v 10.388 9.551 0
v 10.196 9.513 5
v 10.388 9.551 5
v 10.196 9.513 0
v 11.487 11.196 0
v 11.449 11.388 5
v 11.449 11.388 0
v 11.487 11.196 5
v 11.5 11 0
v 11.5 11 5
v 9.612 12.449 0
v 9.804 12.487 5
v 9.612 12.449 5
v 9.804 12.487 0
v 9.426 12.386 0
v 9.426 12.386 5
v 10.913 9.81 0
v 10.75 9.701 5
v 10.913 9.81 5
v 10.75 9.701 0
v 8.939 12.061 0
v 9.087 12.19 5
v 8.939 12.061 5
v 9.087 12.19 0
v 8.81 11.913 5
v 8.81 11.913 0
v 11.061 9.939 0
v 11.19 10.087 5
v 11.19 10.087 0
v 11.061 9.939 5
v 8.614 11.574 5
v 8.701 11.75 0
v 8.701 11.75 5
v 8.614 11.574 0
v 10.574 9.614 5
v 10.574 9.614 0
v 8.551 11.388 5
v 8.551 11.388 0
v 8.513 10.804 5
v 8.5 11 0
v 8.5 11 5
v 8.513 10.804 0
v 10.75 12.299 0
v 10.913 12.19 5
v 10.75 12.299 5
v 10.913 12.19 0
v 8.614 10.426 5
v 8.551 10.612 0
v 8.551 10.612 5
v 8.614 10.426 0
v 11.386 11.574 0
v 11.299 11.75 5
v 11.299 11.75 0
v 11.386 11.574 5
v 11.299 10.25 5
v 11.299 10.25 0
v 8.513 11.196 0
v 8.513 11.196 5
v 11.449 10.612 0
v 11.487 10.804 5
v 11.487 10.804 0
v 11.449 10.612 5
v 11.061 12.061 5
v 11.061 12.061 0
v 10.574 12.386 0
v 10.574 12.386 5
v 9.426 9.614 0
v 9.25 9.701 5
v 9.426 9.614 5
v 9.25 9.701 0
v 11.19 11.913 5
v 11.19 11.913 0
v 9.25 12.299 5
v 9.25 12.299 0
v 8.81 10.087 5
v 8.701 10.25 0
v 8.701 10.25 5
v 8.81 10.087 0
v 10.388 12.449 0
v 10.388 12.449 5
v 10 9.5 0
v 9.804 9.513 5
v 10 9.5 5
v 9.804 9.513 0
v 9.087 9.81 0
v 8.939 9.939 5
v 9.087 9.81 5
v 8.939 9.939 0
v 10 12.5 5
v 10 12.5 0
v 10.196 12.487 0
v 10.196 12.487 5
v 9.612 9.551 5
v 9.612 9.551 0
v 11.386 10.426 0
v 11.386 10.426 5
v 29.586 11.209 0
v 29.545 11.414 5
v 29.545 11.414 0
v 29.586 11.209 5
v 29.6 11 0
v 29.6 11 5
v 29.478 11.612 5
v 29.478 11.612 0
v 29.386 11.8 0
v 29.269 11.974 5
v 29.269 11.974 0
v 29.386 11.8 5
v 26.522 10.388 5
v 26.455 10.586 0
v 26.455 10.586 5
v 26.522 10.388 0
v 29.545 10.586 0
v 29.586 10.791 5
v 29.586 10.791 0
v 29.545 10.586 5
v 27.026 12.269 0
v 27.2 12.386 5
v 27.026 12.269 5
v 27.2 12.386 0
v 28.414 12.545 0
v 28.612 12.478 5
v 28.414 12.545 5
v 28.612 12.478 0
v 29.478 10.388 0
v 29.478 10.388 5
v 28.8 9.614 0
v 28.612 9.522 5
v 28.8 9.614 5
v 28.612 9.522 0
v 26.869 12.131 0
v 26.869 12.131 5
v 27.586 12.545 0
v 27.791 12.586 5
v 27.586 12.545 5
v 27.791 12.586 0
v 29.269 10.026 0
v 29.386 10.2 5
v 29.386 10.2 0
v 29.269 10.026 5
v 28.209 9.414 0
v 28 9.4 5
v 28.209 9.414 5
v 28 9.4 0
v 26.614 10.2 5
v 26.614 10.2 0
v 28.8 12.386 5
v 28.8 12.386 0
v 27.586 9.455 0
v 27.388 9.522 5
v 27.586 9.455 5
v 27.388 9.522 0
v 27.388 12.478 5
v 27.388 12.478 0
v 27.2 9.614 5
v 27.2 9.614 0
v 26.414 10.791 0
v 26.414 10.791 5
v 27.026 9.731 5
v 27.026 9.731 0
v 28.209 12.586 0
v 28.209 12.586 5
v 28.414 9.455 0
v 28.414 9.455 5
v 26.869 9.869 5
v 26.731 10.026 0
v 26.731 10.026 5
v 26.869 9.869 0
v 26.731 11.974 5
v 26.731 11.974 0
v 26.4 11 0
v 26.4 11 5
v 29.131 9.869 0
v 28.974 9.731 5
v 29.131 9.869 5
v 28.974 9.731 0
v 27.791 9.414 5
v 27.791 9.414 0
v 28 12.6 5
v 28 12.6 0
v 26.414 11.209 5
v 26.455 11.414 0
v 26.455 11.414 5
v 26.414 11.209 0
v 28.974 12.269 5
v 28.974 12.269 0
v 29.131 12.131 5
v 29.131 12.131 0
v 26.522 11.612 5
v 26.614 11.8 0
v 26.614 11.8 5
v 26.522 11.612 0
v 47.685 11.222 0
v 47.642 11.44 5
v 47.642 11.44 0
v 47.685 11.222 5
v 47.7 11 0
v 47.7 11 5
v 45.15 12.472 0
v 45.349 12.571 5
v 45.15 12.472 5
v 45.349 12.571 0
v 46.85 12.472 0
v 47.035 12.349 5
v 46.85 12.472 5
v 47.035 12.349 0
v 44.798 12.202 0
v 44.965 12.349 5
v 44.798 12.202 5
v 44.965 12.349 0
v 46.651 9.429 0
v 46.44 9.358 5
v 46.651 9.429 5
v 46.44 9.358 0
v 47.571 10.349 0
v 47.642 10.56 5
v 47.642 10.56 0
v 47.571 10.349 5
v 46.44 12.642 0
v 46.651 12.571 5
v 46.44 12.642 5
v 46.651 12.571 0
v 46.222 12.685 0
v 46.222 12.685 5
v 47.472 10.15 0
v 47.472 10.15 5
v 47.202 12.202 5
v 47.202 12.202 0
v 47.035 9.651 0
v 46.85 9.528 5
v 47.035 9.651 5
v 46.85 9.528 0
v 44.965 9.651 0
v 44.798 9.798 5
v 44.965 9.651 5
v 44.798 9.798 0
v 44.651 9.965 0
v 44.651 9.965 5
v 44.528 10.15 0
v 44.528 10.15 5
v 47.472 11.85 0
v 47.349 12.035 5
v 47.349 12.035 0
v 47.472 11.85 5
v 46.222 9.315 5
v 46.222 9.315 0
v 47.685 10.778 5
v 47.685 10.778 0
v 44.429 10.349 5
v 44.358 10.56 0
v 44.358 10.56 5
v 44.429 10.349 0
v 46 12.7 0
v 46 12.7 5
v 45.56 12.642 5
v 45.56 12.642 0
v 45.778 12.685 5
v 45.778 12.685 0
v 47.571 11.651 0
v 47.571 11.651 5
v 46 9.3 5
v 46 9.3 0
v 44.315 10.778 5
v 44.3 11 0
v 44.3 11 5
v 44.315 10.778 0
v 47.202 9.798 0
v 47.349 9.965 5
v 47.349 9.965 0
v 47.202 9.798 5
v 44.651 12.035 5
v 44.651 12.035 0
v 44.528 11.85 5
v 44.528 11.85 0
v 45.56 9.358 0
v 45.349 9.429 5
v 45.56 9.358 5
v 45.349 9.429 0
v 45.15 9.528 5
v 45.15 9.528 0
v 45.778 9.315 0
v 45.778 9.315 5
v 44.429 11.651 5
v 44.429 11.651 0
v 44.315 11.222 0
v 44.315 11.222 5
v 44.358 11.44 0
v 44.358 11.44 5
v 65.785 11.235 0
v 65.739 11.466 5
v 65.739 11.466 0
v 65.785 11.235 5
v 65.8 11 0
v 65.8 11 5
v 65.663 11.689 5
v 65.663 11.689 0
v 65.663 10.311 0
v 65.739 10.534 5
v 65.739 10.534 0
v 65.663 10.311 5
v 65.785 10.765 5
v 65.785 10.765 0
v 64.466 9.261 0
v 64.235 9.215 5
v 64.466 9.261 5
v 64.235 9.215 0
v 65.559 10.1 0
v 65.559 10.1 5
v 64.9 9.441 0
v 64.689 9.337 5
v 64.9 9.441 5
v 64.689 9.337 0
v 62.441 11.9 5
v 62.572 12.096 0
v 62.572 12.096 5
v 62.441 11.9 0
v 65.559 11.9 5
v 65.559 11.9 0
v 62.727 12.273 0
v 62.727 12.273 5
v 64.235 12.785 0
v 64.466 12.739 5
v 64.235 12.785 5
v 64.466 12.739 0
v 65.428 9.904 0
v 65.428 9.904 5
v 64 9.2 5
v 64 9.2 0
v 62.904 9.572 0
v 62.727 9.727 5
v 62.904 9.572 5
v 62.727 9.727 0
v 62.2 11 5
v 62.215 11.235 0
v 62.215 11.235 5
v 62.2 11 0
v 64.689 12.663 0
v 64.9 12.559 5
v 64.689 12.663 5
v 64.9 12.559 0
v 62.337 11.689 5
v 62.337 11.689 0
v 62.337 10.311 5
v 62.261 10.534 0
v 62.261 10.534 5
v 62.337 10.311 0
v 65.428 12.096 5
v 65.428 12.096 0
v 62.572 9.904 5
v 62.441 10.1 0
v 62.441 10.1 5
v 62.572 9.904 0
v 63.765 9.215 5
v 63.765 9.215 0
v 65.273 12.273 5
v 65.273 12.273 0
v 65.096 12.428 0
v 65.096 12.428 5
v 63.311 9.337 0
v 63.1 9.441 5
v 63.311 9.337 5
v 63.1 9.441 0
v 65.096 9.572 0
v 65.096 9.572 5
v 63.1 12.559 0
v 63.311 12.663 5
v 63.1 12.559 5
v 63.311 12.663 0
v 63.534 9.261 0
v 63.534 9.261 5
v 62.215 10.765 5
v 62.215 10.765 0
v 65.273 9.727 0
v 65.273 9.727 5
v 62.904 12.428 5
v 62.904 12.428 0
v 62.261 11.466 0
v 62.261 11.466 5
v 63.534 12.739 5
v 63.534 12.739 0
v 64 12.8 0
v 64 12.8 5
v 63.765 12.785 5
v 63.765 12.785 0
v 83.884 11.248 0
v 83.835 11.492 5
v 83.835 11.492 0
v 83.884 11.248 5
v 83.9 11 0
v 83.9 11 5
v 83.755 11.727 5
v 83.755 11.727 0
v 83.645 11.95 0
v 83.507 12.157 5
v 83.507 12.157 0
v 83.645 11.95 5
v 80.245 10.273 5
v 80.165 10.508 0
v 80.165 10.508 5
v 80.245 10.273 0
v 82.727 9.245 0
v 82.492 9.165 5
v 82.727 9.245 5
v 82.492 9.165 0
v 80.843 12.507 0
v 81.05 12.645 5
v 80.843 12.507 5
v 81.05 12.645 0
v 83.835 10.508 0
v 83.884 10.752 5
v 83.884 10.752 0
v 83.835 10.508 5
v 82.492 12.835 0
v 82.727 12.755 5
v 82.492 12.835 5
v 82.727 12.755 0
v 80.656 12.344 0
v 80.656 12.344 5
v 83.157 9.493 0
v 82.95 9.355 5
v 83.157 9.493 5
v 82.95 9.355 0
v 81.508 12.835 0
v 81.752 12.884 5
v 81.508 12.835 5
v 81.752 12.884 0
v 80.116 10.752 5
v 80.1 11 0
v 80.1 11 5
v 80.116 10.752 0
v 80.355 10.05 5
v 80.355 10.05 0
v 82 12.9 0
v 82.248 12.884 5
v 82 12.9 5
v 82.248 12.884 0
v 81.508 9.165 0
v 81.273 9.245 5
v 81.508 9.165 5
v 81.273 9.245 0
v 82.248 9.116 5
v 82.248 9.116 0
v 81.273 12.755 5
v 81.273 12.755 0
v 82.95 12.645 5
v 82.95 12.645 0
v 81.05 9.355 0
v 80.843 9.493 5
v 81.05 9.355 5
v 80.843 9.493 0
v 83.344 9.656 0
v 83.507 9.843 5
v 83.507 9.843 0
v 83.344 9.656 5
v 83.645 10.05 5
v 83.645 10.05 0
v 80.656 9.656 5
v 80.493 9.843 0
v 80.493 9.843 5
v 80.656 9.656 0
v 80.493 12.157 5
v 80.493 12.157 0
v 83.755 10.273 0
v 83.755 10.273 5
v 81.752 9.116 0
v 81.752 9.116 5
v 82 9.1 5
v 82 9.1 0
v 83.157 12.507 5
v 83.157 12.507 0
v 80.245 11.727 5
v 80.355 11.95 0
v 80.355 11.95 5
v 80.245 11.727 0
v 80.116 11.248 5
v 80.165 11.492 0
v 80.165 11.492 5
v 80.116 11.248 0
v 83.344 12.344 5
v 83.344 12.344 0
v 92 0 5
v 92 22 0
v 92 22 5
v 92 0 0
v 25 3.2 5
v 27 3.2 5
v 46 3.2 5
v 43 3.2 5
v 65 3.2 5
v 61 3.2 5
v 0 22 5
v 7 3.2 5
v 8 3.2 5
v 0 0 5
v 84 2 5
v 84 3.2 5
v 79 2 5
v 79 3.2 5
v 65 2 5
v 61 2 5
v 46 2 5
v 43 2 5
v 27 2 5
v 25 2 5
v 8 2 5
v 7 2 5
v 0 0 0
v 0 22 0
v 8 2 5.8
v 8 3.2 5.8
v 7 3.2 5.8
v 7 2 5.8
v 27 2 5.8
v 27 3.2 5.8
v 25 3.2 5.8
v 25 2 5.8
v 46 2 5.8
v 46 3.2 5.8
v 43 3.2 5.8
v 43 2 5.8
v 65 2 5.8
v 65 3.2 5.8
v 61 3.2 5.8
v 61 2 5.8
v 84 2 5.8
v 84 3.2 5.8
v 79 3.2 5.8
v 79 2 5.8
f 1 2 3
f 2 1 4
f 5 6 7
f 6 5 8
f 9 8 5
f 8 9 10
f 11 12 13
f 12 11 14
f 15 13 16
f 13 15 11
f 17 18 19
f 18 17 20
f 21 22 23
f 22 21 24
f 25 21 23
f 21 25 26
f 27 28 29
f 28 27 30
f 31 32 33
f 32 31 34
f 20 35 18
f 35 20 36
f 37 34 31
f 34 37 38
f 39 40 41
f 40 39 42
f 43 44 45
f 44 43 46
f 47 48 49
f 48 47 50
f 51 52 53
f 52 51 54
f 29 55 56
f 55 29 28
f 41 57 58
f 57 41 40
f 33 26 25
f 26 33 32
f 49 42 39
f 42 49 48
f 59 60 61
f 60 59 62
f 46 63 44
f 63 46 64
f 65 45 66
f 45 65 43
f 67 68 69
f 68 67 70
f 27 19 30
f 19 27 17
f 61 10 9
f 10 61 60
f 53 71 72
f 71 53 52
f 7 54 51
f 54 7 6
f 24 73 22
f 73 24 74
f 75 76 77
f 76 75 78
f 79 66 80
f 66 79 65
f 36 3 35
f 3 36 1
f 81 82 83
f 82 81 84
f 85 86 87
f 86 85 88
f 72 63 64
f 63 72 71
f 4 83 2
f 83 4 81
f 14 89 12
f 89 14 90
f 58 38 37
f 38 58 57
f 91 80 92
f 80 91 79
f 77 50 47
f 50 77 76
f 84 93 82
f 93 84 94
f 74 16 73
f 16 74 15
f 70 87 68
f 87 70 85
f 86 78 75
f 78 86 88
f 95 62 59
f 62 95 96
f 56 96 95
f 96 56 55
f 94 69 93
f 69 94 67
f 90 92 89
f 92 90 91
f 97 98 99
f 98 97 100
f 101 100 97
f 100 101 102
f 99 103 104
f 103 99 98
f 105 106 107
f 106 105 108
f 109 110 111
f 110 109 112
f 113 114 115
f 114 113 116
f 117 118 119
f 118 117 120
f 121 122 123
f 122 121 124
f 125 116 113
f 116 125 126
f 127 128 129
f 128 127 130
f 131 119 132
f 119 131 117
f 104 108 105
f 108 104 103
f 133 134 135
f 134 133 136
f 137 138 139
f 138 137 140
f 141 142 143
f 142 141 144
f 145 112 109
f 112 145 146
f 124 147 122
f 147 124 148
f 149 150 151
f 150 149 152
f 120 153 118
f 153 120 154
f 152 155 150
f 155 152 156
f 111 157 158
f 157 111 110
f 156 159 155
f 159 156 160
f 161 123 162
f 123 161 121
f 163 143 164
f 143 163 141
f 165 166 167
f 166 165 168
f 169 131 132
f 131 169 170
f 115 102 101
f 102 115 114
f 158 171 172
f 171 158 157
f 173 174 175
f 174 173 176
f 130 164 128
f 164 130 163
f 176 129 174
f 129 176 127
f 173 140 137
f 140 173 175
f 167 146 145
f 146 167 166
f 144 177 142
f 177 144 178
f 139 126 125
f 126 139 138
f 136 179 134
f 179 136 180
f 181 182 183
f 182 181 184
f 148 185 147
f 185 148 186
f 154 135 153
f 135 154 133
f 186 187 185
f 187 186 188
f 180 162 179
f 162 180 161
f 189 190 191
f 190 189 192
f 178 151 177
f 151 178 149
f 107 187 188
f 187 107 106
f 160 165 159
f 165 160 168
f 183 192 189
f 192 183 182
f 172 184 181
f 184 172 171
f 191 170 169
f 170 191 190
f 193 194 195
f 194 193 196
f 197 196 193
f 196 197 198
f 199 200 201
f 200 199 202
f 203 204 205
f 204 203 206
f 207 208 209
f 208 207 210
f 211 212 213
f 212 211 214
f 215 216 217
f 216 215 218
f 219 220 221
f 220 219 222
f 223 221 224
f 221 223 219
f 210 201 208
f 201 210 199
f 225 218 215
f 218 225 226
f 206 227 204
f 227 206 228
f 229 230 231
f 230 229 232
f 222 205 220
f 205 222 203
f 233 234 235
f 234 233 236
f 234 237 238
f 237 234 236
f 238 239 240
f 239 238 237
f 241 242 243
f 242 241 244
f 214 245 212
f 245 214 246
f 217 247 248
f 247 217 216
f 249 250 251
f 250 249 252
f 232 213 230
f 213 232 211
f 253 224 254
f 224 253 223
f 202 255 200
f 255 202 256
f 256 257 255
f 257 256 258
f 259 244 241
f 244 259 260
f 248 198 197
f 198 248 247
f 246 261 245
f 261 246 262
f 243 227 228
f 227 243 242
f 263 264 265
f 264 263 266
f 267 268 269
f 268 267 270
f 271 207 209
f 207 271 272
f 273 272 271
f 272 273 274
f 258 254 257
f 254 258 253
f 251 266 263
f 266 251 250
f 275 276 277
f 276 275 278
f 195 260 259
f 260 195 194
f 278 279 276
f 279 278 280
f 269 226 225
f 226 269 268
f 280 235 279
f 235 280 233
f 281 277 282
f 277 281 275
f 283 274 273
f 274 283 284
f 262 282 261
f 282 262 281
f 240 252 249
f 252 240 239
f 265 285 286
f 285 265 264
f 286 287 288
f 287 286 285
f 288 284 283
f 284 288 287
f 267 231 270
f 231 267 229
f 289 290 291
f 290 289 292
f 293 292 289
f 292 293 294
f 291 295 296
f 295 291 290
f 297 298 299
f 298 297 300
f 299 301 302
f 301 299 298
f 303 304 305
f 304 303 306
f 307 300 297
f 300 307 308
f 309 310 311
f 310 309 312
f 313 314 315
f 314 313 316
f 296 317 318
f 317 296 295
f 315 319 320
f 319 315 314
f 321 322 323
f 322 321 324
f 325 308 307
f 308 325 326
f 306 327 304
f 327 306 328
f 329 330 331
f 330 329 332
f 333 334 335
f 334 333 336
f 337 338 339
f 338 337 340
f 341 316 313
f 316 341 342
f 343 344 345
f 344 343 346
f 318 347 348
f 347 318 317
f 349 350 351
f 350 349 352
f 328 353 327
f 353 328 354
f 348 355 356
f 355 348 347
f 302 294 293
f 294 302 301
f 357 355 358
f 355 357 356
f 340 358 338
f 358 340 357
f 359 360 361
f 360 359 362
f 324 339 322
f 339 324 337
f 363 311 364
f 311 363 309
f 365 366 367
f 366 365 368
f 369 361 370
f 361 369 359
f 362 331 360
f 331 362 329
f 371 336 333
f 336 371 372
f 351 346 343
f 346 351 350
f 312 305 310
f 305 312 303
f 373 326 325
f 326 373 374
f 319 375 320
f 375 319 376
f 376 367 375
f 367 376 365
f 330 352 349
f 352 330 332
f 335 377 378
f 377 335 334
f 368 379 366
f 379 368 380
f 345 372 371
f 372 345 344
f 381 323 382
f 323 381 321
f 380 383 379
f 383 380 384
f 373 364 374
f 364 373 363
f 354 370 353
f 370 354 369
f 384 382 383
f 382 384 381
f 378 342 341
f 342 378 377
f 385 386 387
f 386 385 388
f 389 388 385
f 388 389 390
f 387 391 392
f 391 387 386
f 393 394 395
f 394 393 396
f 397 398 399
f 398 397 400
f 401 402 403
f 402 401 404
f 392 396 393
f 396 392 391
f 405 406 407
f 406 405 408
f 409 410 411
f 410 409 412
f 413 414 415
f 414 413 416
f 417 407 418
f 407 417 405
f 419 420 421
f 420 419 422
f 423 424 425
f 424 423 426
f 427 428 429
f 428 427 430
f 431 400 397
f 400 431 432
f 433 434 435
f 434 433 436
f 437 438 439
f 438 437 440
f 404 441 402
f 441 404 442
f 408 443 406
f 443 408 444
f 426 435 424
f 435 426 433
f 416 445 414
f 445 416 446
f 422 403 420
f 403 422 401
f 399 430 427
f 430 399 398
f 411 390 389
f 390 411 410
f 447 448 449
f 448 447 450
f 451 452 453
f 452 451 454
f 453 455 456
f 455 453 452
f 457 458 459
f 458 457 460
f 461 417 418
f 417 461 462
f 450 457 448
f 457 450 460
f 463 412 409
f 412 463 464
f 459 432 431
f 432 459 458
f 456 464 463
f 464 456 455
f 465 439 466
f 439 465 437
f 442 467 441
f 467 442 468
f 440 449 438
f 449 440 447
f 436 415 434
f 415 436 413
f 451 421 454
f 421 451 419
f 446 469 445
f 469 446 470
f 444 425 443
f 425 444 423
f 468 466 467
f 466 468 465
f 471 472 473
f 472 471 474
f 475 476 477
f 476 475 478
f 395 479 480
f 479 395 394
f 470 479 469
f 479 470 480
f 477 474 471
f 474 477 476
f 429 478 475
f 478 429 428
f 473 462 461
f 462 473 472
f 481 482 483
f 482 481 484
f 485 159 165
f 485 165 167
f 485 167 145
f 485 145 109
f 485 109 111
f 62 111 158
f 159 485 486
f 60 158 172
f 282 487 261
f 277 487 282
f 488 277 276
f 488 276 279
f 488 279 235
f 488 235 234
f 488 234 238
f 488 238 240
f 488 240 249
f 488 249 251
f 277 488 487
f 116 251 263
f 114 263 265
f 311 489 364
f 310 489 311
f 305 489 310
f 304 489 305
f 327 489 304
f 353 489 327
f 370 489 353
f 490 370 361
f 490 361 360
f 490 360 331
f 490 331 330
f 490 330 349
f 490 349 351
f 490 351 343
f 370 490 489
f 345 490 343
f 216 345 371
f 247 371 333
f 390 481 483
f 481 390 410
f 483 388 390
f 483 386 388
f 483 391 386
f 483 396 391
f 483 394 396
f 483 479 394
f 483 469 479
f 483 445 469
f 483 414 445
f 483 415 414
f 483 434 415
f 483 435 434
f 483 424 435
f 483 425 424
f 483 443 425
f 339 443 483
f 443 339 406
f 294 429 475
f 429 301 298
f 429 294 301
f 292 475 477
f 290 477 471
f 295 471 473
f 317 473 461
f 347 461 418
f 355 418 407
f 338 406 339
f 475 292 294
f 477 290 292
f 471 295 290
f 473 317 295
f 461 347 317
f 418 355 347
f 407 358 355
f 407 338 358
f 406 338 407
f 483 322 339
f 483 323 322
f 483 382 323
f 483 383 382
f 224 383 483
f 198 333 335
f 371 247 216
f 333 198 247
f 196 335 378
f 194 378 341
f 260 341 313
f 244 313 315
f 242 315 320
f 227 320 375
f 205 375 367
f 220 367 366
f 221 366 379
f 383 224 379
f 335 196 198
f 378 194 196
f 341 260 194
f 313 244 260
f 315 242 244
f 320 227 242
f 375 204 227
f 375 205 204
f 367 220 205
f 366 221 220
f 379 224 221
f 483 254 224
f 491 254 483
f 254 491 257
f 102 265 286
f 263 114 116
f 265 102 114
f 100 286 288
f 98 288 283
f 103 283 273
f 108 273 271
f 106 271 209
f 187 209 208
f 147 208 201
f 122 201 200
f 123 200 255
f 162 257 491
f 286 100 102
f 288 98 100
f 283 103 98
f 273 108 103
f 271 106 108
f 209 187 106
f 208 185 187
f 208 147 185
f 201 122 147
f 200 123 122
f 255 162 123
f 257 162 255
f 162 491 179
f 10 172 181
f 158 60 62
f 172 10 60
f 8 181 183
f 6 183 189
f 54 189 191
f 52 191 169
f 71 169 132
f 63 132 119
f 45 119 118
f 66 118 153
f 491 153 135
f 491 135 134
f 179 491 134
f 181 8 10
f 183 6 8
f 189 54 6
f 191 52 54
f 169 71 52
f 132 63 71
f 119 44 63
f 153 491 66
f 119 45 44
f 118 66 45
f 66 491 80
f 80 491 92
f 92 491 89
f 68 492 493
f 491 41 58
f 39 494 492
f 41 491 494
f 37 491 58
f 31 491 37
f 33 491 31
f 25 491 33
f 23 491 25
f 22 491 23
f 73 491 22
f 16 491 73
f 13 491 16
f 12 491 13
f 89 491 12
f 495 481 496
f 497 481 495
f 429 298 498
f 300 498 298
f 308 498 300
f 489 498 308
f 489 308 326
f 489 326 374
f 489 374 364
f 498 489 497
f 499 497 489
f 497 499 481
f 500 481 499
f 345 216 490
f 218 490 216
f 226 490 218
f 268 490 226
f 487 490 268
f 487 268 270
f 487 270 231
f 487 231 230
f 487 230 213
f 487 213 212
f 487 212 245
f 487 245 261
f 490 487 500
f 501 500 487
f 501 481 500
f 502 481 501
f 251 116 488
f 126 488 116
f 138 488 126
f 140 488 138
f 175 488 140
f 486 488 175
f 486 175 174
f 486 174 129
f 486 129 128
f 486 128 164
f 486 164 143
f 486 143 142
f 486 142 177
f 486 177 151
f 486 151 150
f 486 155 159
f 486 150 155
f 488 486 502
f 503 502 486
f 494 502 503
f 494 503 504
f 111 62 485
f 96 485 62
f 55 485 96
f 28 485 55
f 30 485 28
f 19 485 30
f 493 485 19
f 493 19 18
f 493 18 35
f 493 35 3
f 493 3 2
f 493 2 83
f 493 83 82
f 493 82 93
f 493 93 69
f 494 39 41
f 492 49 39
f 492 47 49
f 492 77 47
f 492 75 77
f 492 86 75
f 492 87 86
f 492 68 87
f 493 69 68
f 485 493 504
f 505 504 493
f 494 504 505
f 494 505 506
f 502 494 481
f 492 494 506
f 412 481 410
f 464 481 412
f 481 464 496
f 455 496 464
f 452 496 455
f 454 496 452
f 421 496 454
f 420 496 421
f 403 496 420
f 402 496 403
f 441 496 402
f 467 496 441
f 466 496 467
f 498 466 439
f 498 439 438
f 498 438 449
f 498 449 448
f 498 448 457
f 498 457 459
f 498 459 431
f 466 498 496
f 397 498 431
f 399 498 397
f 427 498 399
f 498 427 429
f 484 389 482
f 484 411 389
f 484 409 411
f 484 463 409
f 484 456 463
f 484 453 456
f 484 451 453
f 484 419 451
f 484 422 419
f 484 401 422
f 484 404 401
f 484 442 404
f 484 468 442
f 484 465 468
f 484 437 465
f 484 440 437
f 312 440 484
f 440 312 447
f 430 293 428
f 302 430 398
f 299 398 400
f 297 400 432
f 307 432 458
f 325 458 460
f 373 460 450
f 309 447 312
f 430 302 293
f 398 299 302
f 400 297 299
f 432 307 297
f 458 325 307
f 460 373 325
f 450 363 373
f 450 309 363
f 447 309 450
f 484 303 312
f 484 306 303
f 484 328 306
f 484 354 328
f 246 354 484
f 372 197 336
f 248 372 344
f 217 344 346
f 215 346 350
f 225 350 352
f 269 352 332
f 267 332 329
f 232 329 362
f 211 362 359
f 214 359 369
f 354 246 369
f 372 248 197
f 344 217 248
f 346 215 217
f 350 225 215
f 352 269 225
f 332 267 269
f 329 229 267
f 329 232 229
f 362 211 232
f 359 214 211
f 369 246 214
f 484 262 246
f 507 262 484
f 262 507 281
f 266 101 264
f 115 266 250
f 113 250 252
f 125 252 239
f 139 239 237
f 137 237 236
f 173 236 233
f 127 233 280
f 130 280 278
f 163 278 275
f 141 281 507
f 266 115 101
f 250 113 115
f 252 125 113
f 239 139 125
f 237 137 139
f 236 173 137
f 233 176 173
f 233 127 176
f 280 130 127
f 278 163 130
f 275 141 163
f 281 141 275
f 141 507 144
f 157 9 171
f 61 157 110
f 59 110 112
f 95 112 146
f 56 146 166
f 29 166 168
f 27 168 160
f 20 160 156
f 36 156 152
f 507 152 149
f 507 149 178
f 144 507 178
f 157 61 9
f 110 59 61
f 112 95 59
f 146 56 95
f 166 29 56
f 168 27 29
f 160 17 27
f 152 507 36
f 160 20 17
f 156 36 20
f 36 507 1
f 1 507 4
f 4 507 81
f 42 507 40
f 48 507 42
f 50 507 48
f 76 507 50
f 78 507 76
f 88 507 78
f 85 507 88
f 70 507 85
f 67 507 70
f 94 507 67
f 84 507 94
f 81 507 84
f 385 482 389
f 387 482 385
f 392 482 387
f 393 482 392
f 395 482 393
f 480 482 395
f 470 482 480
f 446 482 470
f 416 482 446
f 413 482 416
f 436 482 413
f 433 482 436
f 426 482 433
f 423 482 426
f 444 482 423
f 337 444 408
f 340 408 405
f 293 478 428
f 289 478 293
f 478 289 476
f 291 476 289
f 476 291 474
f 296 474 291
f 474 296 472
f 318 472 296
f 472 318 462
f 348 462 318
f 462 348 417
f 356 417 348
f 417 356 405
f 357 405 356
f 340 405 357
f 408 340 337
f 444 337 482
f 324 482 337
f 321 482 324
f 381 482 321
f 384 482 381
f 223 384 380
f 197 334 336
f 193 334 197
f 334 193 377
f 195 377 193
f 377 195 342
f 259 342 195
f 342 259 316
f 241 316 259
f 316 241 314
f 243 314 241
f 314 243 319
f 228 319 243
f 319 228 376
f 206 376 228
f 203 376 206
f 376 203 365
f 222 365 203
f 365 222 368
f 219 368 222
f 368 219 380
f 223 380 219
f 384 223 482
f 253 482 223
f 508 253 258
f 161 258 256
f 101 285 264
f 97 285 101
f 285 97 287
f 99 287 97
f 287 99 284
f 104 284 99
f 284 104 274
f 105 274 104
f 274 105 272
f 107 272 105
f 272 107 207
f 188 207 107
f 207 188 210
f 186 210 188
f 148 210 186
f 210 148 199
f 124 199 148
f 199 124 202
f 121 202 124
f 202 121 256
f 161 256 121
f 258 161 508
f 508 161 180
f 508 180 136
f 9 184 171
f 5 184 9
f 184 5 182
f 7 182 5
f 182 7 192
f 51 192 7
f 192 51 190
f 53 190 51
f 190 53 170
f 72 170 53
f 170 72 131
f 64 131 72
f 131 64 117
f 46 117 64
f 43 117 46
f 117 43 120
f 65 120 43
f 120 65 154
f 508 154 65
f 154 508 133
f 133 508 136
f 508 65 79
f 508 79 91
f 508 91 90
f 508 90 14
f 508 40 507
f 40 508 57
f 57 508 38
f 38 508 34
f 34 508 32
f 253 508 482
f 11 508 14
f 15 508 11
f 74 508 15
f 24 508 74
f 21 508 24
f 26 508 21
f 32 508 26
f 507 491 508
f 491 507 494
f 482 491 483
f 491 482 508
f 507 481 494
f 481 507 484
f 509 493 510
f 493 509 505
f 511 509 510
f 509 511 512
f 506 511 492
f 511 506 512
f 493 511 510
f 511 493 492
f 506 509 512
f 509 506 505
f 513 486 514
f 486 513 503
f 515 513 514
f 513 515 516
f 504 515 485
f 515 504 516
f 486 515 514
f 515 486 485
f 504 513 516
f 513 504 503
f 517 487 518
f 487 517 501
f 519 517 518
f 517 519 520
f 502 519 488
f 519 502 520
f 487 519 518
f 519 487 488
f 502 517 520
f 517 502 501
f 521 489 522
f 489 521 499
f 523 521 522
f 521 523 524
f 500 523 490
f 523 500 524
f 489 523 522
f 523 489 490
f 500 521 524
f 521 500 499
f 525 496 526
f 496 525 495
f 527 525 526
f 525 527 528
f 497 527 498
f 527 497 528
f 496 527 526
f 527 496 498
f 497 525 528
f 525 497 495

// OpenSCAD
$fn = 48;

plate_length = 92;
plate_width = 22;
plate_thickness = 5;
edge_margin = 10;
hole_ds = [3.0, 3.2, 3.4, 3.6, 3.8];

module label_bar(length = 8, width = 1.2, height = 0.8) {
    cube([length, width, height]);
}

difference() {
    cube([plate_length, plate_width, plate_thickness]);

    spacing = (plate_length - edge_margin * 2) / (len(hole_ds) - 1);
    for (i = [0 : len(hole_ds) - 1]) {
        x = edge_margin + i * spacing;
        translate([x, plate_width / 2, -0.1])
            cylinder(h = plate_thickness + 0.2, d = hole_ds[i]);
    }
}

// Simple visual markers so each hole can be mapped back to the README table.
spacing = (plate_length - edge_margin * 2) / (len(hole_ds) - 1);
for (i = [0 : len(hole_ds) - 1]) {
    x = edge_margin + i * spacing - 3;
    translate([x, 2, plate_thickness])
        label_bar(length = i + 1);
}
